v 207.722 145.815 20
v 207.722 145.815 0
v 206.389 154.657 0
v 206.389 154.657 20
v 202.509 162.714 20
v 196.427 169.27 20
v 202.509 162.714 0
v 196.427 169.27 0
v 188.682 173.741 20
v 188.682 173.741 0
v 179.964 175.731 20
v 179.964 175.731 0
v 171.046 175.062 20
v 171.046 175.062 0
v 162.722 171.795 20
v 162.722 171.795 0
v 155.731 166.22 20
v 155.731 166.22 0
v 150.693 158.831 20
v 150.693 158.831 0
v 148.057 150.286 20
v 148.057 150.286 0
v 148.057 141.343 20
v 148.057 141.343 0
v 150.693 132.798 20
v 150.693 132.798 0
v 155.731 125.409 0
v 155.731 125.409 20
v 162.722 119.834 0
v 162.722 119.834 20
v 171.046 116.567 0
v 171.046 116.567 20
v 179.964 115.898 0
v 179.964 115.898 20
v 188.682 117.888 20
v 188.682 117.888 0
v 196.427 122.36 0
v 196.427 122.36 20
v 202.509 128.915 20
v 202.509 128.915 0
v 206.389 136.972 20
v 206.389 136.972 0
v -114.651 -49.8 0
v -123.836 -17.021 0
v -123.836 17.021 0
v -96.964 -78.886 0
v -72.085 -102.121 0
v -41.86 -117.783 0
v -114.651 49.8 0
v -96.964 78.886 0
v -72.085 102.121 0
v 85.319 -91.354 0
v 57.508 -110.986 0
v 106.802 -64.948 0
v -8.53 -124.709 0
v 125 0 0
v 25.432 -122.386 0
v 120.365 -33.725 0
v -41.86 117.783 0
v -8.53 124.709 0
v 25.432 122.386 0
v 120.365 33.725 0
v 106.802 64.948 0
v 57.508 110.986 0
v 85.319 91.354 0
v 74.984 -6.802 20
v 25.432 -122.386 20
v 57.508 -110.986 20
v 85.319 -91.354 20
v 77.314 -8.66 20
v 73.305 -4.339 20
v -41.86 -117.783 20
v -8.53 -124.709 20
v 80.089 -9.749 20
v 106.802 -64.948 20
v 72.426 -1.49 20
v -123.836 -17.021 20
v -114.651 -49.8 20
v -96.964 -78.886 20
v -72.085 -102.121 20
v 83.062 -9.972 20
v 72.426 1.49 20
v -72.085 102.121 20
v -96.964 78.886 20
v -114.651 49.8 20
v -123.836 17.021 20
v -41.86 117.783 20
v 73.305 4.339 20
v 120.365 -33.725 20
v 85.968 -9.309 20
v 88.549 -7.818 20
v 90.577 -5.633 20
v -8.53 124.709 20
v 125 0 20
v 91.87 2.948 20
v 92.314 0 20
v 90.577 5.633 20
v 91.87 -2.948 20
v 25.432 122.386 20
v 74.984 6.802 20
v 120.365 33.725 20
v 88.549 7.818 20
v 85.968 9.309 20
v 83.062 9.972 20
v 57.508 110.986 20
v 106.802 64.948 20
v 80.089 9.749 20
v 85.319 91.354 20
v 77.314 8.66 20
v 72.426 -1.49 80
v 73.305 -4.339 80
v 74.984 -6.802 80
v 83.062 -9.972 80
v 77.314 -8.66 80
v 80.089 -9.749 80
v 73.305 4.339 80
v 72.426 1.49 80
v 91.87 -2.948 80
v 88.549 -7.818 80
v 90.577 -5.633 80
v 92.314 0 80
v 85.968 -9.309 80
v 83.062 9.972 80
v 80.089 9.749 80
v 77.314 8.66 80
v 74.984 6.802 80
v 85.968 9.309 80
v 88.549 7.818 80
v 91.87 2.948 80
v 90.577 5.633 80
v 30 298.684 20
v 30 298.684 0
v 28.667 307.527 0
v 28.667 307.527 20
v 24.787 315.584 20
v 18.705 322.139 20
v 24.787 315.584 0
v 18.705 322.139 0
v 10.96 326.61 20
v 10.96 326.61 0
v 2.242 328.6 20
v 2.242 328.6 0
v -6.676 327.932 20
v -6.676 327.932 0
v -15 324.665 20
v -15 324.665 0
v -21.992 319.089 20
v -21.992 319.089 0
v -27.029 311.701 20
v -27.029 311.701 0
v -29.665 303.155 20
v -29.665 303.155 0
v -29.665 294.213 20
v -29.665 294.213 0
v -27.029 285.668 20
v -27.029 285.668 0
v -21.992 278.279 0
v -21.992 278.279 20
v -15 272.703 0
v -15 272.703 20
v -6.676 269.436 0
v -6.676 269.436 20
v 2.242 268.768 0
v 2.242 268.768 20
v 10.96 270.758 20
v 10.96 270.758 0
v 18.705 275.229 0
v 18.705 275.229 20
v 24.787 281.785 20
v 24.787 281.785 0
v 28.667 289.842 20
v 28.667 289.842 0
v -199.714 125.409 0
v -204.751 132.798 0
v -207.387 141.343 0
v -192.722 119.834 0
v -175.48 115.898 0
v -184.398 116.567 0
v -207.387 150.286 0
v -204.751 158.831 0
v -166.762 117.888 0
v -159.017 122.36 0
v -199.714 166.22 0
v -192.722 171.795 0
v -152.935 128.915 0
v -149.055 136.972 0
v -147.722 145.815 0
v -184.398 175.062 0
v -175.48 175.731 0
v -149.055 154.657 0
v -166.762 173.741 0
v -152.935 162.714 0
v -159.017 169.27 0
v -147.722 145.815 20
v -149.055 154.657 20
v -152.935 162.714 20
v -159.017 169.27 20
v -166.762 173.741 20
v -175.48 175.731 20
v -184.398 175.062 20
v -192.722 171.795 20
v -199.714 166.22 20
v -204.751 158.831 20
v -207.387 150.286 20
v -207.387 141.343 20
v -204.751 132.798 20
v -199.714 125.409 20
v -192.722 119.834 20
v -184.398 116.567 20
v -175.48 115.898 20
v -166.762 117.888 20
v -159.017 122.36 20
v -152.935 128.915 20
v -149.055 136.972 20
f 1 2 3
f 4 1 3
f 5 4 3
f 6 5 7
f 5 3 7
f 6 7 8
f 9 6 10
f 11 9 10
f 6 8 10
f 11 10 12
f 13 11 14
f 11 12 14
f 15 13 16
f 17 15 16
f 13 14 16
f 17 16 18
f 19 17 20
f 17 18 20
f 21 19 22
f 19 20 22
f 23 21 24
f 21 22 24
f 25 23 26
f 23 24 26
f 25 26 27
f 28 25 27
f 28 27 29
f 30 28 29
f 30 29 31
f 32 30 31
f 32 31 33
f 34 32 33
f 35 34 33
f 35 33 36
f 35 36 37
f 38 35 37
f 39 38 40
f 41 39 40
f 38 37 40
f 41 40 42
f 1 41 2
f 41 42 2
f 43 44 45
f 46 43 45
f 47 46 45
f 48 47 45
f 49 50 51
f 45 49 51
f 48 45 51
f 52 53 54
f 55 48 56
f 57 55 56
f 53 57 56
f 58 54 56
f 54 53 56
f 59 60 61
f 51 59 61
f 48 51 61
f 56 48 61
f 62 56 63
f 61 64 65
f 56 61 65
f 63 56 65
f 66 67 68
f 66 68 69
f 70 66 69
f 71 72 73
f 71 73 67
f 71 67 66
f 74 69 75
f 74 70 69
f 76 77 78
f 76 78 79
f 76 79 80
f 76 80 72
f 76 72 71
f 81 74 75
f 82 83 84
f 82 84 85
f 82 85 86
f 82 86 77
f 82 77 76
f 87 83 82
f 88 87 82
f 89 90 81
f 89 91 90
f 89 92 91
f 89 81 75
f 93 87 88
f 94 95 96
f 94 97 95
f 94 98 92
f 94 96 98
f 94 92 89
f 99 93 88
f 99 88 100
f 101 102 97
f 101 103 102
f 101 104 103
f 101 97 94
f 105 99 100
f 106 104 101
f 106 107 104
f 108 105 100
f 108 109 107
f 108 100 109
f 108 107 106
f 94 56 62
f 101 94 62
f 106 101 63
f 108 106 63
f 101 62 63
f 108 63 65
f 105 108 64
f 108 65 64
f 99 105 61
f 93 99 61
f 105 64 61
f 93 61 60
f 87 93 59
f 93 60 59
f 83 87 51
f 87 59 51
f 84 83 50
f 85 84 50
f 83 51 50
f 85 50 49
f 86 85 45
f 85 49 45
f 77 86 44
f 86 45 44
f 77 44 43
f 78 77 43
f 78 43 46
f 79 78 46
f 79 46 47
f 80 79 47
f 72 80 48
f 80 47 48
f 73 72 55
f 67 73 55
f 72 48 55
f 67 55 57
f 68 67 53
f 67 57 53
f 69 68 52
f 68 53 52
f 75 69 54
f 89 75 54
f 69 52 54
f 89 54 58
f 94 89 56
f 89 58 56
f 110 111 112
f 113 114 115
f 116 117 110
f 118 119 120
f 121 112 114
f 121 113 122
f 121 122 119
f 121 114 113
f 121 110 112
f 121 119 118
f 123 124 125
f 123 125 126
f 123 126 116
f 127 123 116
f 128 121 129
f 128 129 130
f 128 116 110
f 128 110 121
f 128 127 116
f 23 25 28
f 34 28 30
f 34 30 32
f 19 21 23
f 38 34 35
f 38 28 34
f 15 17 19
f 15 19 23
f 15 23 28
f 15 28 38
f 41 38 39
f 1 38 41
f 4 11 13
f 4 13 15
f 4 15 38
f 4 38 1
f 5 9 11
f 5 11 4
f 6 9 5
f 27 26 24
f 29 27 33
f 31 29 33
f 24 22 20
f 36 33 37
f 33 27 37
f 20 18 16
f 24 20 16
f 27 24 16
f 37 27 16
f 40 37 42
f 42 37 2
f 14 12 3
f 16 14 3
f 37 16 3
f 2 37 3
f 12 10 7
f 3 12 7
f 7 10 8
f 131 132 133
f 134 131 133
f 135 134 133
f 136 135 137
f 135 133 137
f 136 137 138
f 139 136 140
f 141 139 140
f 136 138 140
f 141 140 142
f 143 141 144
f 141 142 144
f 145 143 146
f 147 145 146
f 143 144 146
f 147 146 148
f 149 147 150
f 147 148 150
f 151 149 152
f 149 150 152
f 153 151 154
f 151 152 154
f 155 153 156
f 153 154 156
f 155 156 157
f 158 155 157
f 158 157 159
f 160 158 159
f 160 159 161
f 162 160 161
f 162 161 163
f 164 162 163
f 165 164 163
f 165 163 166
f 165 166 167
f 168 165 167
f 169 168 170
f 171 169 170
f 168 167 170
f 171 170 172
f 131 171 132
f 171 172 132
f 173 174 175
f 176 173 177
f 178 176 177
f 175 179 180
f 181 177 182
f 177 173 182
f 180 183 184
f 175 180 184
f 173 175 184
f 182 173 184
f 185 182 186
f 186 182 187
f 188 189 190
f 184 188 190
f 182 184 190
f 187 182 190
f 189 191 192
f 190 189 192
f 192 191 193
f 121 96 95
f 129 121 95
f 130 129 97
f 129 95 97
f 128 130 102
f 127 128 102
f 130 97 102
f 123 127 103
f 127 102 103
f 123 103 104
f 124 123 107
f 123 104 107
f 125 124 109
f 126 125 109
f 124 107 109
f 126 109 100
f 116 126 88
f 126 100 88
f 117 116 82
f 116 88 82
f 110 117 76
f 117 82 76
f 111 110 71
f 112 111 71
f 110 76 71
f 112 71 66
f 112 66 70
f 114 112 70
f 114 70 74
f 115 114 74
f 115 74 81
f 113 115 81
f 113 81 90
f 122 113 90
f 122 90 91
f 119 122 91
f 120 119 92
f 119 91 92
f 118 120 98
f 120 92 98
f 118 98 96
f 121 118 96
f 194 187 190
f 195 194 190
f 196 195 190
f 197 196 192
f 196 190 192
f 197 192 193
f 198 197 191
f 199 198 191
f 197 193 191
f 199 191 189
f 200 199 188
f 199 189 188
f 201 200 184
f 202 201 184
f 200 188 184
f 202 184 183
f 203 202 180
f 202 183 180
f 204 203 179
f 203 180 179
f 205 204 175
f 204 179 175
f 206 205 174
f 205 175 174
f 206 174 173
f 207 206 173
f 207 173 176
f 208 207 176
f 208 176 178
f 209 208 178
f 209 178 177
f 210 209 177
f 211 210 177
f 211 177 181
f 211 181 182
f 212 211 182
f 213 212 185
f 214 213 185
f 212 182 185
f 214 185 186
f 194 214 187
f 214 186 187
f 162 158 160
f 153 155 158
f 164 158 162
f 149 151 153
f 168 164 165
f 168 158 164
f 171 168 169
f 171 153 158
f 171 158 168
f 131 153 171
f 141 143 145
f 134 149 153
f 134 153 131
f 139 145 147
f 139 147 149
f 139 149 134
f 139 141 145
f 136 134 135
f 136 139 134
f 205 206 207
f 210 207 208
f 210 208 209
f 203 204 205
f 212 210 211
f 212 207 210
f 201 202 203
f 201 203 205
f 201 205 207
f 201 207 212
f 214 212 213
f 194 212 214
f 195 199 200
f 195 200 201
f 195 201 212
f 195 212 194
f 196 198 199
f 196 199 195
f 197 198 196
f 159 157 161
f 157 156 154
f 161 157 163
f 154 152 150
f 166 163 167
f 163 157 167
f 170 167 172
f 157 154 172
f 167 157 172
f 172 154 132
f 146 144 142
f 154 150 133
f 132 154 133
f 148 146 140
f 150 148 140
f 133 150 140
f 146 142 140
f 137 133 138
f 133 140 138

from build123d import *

# Parameters (mm, degrees)
F0_R     = 125
F0_R_2   = 30
F1_DEPTH = 20
F2_R     = 10
F3_DEPTH = 60


with BuildPart() as f1:
    # F0 (on Top) → F1 (new body)
    with BuildSketch(Plane.XY):
        Circle(F0_R)
        with Locations((177.722067, 145.814583)):
            Circle(F0_R_2)
        with Locations((-177.722067, 145.814583)):
            Circle(F0_R_2)
        with Locations((0, 298.68421)):
            Circle(F0_R_2)
    extrude(amount=F1_DEPTH)

    # F2 (on face) → F3 (join)
    with BuildSketch(Plane.XY.offset(20)):
        with Locations((82.314318, 0)):
            Circle(F2_R)
    extrude(amount=F3_DEPTH)


solid = f1.part
